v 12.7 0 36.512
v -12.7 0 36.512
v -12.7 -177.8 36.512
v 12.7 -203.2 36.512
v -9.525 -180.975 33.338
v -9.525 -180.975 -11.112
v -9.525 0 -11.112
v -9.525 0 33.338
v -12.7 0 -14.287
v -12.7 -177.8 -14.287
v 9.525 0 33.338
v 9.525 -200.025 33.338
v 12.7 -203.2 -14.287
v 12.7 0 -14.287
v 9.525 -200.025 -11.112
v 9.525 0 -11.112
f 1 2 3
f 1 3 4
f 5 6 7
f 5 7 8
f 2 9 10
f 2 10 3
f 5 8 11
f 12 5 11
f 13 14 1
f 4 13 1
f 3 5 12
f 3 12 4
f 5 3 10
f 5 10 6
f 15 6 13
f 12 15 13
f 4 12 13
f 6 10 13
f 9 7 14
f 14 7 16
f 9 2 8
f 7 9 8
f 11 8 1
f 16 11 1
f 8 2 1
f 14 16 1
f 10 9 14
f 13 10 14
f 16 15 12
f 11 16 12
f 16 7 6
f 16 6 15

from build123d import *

# Parameters (mm, degrees)
F0_W        = 25.4
F0_H        = 50.8
F0_W_2      = 19.05
F0_H_2      = 44.45
F1_DEPTH    = 203.2
F2_T1_DEPTH = 181.4414957887


# Not quite as in the source:
# - a fillet or chamfer that OpenCascade refuses, or shapes differently, is made with other operations: its cross-section is extruded or revolved along the edge and cut away or added


with BuildPart() as f1:
    # F0 (on Front) → F1 (new body)
    with BuildSketch(Plane.XZ):
        with Locations((0, 11.1125)):
            Rectangle(F0_W, F0_H)
        with Locations((0, 11.1125)):
            Rectangle(F0_W_2, F0_H_2, mode=Mode.SUBTRACT)
    extrude(amount=F1_DEPTH)

    # F2: chamfer of 25.4 on 1 edges, made by hand

    # F2_s2 → F2_t1 (cut)
    with BuildSketch(Plane.XY.offset(-79.6082478943)):
        Polygon((-12.7, -177.8), (12.7, -203.2), (-12.7, -203.2), align=None)
    extrude(amount=F2_T1_DEPTH, mode=Mode.SUBTRACT)


solid = f1.part
